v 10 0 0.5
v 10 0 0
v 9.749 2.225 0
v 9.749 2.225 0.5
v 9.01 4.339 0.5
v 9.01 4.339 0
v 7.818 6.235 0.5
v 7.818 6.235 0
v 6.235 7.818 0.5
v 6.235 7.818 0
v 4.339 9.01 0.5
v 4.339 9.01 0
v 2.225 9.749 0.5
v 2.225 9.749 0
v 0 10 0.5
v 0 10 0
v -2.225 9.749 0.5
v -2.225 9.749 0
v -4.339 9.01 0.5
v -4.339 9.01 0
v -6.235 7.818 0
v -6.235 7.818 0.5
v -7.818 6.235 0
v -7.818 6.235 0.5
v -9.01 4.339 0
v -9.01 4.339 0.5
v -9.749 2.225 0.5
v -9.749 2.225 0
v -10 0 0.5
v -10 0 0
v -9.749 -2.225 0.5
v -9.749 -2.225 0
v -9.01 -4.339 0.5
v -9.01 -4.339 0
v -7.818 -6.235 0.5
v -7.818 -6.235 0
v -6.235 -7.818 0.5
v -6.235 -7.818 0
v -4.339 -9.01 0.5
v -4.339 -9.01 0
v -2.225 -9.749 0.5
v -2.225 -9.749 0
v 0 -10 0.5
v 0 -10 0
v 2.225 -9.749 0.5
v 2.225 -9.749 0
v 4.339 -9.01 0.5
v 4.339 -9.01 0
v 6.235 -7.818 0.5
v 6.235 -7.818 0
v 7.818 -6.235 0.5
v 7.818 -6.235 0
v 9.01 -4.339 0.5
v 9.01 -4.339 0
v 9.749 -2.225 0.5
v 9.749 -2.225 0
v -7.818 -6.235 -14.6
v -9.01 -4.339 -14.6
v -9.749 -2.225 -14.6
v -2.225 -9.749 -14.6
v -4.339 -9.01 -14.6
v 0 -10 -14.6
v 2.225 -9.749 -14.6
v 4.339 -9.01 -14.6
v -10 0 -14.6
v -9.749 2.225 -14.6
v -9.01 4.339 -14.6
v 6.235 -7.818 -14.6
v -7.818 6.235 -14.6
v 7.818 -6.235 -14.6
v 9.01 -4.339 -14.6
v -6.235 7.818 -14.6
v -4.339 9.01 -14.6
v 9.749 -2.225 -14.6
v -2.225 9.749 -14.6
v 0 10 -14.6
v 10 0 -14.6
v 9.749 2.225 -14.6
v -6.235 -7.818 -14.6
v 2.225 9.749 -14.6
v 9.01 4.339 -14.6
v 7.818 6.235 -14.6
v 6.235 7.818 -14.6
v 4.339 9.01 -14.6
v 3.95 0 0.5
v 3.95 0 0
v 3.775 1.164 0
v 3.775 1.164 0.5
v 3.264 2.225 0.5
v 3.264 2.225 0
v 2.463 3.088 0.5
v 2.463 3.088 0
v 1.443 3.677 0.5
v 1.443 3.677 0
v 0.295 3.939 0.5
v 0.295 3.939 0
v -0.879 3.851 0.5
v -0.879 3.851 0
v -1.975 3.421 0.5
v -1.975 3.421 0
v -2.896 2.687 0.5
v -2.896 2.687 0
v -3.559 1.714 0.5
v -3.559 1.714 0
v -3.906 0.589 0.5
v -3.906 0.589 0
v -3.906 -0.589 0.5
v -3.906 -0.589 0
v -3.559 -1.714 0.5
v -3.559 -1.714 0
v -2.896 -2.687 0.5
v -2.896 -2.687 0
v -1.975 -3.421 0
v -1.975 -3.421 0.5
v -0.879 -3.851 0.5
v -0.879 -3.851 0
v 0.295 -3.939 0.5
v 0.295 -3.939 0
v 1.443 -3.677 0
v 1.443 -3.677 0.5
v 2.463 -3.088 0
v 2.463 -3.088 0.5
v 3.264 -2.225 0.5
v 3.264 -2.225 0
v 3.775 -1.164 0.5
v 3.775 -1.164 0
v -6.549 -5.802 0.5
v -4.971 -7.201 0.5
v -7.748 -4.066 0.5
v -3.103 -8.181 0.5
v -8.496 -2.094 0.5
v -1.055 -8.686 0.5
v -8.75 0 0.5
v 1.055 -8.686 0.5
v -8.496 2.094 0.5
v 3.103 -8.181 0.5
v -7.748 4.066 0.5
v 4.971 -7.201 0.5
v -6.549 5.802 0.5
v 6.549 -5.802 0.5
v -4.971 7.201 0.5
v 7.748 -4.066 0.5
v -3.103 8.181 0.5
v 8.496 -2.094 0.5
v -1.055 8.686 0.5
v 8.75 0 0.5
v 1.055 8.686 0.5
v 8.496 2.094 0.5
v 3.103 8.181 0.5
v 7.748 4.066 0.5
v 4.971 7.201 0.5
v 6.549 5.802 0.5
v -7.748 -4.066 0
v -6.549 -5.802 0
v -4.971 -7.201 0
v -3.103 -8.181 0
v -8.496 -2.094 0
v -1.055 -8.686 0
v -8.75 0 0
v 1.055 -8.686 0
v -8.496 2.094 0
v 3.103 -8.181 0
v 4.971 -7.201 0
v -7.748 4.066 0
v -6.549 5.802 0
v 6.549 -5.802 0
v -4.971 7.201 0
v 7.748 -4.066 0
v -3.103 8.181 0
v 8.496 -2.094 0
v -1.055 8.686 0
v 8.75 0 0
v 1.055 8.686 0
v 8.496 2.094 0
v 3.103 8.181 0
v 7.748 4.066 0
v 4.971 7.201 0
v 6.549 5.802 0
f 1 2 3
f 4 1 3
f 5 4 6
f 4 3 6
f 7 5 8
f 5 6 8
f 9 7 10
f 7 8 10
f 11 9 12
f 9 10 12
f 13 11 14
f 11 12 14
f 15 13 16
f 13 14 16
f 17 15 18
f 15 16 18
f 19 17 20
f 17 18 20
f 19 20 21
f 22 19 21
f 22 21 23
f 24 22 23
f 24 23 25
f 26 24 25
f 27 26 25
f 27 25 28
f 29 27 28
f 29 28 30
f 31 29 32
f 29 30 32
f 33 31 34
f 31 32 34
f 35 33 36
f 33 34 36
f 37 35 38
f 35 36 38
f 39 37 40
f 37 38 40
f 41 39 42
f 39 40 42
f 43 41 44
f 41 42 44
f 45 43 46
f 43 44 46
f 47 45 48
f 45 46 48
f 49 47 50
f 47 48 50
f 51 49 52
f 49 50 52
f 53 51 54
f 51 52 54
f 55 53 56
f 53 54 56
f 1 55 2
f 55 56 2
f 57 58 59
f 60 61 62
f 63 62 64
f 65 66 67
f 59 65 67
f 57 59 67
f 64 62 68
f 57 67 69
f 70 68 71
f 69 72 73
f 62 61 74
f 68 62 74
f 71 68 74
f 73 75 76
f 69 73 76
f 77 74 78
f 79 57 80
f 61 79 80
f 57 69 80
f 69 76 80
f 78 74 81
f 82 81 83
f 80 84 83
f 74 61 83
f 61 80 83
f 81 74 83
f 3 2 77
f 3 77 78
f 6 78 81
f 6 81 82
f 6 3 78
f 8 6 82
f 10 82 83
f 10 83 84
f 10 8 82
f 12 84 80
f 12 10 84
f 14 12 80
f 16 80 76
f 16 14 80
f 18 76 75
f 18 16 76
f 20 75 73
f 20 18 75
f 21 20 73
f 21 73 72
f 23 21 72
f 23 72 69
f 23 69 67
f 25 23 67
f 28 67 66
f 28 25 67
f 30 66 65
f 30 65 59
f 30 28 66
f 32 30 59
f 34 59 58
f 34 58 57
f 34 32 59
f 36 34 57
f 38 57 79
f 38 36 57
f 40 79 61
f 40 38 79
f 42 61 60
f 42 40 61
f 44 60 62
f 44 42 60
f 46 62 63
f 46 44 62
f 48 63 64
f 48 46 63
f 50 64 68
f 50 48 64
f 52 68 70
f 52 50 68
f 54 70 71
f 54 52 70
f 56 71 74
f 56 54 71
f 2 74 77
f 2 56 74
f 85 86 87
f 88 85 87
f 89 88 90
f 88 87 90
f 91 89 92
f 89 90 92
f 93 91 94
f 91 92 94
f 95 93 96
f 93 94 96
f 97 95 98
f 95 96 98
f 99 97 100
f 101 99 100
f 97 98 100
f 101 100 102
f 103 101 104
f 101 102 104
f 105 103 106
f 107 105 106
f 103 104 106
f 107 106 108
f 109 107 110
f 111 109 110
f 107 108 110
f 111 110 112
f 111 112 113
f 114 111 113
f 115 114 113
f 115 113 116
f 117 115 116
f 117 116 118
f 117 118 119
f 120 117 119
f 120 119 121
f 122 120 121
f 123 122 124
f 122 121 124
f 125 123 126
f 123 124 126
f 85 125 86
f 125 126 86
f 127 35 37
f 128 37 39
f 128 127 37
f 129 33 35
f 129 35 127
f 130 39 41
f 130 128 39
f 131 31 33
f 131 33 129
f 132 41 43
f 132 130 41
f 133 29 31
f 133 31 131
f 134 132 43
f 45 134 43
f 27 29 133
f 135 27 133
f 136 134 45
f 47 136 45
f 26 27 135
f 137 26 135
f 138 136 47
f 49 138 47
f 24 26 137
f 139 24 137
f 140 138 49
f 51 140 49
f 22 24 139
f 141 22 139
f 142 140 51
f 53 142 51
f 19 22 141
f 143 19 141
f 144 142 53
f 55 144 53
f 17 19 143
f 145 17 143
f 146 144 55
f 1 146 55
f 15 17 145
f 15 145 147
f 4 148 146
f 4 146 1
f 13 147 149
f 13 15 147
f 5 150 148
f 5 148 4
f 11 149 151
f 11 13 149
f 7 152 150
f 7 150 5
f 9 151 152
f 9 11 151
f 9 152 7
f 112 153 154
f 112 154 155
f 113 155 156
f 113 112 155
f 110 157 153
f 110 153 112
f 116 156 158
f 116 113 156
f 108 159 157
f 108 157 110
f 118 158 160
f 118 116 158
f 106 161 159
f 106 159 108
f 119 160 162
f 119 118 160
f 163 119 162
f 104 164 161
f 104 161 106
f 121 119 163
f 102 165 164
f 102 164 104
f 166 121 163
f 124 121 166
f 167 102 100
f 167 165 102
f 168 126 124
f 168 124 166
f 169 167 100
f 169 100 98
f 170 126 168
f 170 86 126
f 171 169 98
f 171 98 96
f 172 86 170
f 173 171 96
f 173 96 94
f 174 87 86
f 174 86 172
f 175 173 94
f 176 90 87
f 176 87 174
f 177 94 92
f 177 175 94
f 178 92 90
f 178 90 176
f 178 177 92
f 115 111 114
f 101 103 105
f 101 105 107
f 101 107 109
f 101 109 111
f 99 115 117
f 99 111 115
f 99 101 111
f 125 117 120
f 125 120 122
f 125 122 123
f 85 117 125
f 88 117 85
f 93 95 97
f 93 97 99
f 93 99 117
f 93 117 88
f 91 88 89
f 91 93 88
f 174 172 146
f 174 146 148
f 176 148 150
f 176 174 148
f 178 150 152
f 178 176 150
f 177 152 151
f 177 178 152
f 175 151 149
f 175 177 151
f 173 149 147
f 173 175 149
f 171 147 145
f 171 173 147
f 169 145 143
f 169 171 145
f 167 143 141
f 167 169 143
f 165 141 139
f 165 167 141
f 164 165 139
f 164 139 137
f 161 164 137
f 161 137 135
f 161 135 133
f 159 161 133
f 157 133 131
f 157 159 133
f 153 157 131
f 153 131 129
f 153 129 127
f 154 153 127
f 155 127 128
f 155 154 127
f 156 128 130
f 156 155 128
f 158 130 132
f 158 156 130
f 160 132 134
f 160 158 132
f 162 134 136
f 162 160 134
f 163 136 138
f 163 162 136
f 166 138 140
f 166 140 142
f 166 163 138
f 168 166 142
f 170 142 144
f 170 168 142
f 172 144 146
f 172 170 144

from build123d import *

# Parameters (mm, degrees)
F0_R     = 10
F0_R_2   = 8.75
F0_R_3   = 3.95
F1_DEPTH = 14.6
F2_DEPTH = 0.5


with BuildPart() as f1:
    # F0 (on Top) → F1 (new body)
    with BuildSketch(Plane.XY):
        Circle(F0_R)
        Circle(F0_R_2, mode=Mode.SUBTRACT)
        Circle(F0_R_2)
        Circle(F0_R_3, mode=Mode.SUBTRACT)
        Circle(F0_R_3)
    extrude(amount=-F1_DEPTH)

    # F0 (on Top) → F2 (join)
    with BuildSketch(Plane.XY):
        Circle(F0_R)
        Circle(F0_R_2, mode=Mode.SUBTRACT)
        Circle(F0_R_3)
    extrude(amount=F2_DEPTH)


solid = f1.part
